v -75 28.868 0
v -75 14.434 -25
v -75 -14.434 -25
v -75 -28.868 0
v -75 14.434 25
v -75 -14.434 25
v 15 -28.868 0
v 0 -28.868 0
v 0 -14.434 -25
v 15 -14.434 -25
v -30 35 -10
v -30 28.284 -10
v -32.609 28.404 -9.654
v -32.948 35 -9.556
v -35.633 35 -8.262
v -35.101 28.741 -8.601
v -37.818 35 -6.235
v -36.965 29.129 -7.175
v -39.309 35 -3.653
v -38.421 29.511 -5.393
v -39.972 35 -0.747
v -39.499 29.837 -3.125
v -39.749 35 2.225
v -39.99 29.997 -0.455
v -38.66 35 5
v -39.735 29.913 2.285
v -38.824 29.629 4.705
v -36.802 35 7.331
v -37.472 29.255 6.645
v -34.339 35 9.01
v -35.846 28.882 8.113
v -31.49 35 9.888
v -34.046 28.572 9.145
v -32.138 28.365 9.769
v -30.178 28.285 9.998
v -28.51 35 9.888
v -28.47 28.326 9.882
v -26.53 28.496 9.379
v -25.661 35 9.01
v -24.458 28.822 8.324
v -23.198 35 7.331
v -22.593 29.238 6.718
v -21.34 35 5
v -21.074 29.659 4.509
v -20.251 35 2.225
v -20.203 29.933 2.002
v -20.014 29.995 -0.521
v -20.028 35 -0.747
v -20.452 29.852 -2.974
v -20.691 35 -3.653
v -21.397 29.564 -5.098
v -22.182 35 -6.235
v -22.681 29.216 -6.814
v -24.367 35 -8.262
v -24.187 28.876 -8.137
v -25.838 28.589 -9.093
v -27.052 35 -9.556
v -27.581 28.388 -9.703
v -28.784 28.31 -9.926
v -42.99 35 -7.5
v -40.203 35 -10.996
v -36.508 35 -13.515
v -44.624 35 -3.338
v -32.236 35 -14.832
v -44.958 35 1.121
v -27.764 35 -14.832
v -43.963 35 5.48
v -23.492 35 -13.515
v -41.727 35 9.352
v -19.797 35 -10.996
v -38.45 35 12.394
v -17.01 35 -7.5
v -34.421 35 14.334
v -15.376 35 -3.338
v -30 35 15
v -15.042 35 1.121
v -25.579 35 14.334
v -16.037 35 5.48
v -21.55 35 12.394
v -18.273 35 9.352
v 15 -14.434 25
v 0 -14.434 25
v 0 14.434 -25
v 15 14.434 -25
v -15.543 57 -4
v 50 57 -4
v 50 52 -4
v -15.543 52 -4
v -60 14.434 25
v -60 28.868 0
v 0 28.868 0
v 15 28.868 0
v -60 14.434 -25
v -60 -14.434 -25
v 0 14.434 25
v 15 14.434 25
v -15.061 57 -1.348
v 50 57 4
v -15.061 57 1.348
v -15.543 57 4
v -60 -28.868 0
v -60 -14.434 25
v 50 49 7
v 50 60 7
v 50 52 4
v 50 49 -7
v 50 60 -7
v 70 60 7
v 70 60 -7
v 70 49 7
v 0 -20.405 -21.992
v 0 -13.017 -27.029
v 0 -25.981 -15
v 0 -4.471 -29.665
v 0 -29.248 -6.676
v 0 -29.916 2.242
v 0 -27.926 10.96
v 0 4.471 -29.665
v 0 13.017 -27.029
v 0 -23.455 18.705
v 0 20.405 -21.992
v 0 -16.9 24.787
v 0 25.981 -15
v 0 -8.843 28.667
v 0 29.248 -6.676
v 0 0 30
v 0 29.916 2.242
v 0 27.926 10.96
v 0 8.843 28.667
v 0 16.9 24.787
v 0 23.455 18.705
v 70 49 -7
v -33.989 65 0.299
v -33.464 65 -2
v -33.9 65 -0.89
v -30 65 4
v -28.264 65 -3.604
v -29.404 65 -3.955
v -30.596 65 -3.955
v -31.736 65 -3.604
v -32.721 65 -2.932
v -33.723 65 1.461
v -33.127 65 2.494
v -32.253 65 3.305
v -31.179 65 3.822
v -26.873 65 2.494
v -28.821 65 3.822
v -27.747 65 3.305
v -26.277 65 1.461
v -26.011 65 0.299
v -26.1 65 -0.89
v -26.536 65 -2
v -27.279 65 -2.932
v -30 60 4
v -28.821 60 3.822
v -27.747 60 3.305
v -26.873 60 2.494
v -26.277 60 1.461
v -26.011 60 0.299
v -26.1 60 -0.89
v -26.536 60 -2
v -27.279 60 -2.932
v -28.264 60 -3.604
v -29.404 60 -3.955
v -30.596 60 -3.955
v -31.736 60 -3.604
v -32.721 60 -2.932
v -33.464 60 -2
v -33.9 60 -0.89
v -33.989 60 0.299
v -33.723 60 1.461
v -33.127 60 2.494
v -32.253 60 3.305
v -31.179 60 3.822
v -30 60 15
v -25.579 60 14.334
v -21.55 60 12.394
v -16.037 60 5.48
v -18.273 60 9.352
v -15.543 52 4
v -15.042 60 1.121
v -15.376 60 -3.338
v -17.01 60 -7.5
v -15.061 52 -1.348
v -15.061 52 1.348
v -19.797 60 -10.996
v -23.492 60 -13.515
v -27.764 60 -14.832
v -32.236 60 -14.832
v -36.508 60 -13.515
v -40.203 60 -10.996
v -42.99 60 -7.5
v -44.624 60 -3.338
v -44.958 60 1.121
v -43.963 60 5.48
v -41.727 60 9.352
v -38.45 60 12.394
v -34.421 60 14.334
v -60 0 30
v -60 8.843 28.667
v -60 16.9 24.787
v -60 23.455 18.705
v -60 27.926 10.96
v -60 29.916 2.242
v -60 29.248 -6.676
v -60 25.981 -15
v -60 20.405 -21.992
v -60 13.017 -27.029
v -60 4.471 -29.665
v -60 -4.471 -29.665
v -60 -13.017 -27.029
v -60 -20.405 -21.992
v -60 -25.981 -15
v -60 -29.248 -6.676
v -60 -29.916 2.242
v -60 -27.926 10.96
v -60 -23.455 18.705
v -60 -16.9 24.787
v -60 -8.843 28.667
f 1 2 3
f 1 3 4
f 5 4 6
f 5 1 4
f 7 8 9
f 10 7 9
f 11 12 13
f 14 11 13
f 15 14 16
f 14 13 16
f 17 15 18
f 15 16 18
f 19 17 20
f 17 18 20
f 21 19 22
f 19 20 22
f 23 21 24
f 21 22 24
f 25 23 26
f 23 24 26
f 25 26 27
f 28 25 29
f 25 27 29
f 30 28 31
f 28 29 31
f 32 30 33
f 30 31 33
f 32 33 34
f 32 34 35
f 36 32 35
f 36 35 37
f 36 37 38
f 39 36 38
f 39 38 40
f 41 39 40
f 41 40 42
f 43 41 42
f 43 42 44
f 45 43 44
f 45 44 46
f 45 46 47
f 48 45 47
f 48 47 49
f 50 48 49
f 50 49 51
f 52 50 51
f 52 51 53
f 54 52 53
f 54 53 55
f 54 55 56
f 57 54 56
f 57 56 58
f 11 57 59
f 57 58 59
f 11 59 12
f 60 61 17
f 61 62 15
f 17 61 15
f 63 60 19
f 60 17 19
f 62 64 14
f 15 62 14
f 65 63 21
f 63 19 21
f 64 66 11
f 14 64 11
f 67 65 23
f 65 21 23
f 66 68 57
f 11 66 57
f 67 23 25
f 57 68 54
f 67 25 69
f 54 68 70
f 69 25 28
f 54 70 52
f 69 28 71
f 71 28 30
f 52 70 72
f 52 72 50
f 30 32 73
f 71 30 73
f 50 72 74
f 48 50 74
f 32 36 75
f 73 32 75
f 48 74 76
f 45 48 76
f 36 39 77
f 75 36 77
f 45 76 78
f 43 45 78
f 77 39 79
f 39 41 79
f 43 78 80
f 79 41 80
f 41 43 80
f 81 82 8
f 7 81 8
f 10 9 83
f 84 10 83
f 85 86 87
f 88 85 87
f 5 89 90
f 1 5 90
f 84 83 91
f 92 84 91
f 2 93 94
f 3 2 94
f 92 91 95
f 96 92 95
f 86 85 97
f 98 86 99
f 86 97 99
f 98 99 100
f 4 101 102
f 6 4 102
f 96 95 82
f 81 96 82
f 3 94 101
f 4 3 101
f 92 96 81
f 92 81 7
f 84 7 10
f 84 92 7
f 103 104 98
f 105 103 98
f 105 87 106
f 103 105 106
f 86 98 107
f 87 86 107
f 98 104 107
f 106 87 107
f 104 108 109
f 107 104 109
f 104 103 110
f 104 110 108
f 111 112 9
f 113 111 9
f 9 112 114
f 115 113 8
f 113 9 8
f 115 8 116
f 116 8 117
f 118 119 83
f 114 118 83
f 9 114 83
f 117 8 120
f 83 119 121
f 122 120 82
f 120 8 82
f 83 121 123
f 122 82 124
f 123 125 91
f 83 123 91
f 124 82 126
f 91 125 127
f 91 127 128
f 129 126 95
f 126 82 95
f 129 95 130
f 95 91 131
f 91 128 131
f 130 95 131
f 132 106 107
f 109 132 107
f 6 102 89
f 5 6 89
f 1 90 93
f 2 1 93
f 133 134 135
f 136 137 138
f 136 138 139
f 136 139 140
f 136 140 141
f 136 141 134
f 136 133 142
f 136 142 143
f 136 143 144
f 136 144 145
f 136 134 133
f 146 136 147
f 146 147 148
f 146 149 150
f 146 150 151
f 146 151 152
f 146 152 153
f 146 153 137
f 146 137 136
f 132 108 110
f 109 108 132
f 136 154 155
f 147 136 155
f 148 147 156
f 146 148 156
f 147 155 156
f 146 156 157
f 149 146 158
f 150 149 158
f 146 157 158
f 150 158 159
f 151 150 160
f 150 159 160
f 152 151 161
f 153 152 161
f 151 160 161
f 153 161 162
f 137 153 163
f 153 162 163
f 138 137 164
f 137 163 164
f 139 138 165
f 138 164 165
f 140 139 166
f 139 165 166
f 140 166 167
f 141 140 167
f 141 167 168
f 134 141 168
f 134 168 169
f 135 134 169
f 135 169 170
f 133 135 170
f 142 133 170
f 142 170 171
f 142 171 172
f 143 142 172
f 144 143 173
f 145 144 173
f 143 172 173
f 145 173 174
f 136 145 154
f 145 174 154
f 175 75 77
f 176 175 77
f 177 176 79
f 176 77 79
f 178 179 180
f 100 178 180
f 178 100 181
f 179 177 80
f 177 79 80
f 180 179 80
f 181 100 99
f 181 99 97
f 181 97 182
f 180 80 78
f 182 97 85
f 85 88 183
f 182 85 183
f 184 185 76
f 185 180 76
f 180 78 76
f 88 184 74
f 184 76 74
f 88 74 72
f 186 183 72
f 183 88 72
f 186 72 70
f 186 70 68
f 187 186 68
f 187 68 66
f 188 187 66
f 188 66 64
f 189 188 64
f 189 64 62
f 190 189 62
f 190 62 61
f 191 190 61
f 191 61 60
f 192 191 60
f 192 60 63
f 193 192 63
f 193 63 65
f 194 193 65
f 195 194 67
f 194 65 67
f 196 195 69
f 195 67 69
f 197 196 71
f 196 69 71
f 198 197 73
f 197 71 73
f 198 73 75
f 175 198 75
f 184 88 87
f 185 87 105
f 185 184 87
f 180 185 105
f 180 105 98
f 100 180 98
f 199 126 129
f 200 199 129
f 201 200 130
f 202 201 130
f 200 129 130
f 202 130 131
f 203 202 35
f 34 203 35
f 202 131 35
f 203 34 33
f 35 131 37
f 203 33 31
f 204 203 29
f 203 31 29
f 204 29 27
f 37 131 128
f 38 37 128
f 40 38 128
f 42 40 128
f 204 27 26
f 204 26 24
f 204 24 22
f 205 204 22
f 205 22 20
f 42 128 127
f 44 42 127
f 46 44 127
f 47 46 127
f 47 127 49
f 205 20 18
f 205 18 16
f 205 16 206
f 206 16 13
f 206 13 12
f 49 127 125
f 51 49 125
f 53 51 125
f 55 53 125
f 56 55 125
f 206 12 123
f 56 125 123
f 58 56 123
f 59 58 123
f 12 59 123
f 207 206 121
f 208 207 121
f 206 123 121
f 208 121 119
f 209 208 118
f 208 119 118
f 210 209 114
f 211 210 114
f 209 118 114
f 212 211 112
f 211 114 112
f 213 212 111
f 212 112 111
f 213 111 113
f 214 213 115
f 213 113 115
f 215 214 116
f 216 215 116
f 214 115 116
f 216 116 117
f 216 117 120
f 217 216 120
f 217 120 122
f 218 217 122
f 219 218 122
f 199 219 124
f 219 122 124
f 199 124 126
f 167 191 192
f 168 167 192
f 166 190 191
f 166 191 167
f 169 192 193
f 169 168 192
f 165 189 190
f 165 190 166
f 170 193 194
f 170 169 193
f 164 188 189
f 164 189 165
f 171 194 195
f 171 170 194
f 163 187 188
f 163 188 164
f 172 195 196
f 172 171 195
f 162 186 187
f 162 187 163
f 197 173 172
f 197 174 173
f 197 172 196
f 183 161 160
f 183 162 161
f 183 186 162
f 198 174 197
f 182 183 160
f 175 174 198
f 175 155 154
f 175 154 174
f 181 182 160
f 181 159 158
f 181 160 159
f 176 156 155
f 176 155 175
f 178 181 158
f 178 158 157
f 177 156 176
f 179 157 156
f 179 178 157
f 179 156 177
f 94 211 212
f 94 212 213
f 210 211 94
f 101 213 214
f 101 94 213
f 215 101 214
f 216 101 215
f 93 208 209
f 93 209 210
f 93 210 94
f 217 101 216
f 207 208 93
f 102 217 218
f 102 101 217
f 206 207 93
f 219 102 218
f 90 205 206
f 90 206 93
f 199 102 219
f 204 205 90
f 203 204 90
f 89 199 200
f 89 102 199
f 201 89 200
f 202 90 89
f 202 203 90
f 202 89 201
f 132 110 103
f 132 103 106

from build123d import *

# Parameters (mm, degrees)
EXTRUDE_334_DEPTH = 15
SKETCH_2_R        = 30
EXTRUDE_1_DEPTH   = 60
EXTRUDE_2_DEPTH   = 15
SKETCH_4_R        = 10
EXTRUDE_3_DEPTH   = 35
SKETCH_5_R        = 15
EXTRUDE_4_DEPTH   = 25
SKETCH_6_R        = 4
EXTRUDE_5_DEPTH   = 5
EXTRUDE_6_DEPTH   = 100
SKETCH_8_W        = 14
SKETCH_8_H        = 11
EXTRUDE_7_DEPTH   = 20


with BuildPart() as part:
    # Эскиз1 → Extrude 334 (new body)
    with BuildSketch(Plane(origin=(0, 0, 0), x_dir=(0, 0, -1), z_dir=(1, 0, 0))):
        Polygon((0, 28.867513459), (-25, 14.43375673), (-25, -14.43375673), (0, -28.867513459), (25, -14.43375673), (25, 14.43375673), align=None)
    extrude(amount=EXTRUDE_334_DEPTH)

    # Эскиз2 → Бобышка-Вытянуть1 (add)
    with BuildSketch(Plane.ZY):
        Circle(SKETCH_2_R)
    extrude(amount=EXTRUDE_1_DEPTH)

    # Эскиз3 → Бобышка-Вытянуть2 (add)
    with BuildSketch(Plane.ZY.offset(60)):
        Polygon((0, 28.867513459), (-25, 14.43375673), (-25, -14.43375673), (0, -28.867513459), (25, -14.43375673), (25, 14.43375673), align=None)
    extrude(amount=EXTRUDE_2_DEPTH)

    # Эскиз4 → Бобышка-Вытянуть3 (add)
    with BuildSketch(Plane(origin=(0, 0, 0), x_dir=(1, 0, 0), z_dir=(0, 1, 0))):
        with Locations((-30, 0)):
            Circle(SKETCH_4_R)
    extrude(amount=EXTRUDE_3_DEPTH)

    # Эскиз5 → Бобышка-Вытянуть4 (add)
    with BuildSketch(Plane(origin=(0, 35, 0), x_dir=(-1, 0, 0), z_dir=(0, 1, 0))):
        with Locations((30, 0)):
            Circle(SKETCH_5_R)
    extrude(amount=EXTRUDE_4_DEPTH)

    # Эскиз6 → Бобышка-Вытянуть5 (add)
    with BuildSketch(Plane(origin=(0, 60, 0), x_dir=(-1, 0, 0), z_dir=(0, 1, 0))):
        with Locations((30, 0)):
            Circle(SKETCH_6_R)
    extrude(amount=EXTRUDE_5_DEPTH)

    # Эскиз7 → Бобышка-Вытянуть6 (add)
    with BuildSketch(Plane(origin=(-30, 0, 0), x_dir=(0, 0, -1), z_dir=(1, 0, 0))):
        Polygon((-4, 57), (0, 57), (4, 57), (4, 52), (-4, 52), align=None)
    extrude(amount=EXTRUDE_6_DEPTH)

    # Эскиз8 → Бобышка-Вытянуть7 (add)
    with BuildSketch(Plane(origin=(70, 0, 0), x_dir=(0, 0, -1), z_dir=(1, 0, 0))):
        with Locations((0, 54.5)):
            Rectangle(SKETCH_8_W, SKETCH_8_H)
    extrude(amount=-EXTRUDE_7_DEPTH)


solid = part.part
